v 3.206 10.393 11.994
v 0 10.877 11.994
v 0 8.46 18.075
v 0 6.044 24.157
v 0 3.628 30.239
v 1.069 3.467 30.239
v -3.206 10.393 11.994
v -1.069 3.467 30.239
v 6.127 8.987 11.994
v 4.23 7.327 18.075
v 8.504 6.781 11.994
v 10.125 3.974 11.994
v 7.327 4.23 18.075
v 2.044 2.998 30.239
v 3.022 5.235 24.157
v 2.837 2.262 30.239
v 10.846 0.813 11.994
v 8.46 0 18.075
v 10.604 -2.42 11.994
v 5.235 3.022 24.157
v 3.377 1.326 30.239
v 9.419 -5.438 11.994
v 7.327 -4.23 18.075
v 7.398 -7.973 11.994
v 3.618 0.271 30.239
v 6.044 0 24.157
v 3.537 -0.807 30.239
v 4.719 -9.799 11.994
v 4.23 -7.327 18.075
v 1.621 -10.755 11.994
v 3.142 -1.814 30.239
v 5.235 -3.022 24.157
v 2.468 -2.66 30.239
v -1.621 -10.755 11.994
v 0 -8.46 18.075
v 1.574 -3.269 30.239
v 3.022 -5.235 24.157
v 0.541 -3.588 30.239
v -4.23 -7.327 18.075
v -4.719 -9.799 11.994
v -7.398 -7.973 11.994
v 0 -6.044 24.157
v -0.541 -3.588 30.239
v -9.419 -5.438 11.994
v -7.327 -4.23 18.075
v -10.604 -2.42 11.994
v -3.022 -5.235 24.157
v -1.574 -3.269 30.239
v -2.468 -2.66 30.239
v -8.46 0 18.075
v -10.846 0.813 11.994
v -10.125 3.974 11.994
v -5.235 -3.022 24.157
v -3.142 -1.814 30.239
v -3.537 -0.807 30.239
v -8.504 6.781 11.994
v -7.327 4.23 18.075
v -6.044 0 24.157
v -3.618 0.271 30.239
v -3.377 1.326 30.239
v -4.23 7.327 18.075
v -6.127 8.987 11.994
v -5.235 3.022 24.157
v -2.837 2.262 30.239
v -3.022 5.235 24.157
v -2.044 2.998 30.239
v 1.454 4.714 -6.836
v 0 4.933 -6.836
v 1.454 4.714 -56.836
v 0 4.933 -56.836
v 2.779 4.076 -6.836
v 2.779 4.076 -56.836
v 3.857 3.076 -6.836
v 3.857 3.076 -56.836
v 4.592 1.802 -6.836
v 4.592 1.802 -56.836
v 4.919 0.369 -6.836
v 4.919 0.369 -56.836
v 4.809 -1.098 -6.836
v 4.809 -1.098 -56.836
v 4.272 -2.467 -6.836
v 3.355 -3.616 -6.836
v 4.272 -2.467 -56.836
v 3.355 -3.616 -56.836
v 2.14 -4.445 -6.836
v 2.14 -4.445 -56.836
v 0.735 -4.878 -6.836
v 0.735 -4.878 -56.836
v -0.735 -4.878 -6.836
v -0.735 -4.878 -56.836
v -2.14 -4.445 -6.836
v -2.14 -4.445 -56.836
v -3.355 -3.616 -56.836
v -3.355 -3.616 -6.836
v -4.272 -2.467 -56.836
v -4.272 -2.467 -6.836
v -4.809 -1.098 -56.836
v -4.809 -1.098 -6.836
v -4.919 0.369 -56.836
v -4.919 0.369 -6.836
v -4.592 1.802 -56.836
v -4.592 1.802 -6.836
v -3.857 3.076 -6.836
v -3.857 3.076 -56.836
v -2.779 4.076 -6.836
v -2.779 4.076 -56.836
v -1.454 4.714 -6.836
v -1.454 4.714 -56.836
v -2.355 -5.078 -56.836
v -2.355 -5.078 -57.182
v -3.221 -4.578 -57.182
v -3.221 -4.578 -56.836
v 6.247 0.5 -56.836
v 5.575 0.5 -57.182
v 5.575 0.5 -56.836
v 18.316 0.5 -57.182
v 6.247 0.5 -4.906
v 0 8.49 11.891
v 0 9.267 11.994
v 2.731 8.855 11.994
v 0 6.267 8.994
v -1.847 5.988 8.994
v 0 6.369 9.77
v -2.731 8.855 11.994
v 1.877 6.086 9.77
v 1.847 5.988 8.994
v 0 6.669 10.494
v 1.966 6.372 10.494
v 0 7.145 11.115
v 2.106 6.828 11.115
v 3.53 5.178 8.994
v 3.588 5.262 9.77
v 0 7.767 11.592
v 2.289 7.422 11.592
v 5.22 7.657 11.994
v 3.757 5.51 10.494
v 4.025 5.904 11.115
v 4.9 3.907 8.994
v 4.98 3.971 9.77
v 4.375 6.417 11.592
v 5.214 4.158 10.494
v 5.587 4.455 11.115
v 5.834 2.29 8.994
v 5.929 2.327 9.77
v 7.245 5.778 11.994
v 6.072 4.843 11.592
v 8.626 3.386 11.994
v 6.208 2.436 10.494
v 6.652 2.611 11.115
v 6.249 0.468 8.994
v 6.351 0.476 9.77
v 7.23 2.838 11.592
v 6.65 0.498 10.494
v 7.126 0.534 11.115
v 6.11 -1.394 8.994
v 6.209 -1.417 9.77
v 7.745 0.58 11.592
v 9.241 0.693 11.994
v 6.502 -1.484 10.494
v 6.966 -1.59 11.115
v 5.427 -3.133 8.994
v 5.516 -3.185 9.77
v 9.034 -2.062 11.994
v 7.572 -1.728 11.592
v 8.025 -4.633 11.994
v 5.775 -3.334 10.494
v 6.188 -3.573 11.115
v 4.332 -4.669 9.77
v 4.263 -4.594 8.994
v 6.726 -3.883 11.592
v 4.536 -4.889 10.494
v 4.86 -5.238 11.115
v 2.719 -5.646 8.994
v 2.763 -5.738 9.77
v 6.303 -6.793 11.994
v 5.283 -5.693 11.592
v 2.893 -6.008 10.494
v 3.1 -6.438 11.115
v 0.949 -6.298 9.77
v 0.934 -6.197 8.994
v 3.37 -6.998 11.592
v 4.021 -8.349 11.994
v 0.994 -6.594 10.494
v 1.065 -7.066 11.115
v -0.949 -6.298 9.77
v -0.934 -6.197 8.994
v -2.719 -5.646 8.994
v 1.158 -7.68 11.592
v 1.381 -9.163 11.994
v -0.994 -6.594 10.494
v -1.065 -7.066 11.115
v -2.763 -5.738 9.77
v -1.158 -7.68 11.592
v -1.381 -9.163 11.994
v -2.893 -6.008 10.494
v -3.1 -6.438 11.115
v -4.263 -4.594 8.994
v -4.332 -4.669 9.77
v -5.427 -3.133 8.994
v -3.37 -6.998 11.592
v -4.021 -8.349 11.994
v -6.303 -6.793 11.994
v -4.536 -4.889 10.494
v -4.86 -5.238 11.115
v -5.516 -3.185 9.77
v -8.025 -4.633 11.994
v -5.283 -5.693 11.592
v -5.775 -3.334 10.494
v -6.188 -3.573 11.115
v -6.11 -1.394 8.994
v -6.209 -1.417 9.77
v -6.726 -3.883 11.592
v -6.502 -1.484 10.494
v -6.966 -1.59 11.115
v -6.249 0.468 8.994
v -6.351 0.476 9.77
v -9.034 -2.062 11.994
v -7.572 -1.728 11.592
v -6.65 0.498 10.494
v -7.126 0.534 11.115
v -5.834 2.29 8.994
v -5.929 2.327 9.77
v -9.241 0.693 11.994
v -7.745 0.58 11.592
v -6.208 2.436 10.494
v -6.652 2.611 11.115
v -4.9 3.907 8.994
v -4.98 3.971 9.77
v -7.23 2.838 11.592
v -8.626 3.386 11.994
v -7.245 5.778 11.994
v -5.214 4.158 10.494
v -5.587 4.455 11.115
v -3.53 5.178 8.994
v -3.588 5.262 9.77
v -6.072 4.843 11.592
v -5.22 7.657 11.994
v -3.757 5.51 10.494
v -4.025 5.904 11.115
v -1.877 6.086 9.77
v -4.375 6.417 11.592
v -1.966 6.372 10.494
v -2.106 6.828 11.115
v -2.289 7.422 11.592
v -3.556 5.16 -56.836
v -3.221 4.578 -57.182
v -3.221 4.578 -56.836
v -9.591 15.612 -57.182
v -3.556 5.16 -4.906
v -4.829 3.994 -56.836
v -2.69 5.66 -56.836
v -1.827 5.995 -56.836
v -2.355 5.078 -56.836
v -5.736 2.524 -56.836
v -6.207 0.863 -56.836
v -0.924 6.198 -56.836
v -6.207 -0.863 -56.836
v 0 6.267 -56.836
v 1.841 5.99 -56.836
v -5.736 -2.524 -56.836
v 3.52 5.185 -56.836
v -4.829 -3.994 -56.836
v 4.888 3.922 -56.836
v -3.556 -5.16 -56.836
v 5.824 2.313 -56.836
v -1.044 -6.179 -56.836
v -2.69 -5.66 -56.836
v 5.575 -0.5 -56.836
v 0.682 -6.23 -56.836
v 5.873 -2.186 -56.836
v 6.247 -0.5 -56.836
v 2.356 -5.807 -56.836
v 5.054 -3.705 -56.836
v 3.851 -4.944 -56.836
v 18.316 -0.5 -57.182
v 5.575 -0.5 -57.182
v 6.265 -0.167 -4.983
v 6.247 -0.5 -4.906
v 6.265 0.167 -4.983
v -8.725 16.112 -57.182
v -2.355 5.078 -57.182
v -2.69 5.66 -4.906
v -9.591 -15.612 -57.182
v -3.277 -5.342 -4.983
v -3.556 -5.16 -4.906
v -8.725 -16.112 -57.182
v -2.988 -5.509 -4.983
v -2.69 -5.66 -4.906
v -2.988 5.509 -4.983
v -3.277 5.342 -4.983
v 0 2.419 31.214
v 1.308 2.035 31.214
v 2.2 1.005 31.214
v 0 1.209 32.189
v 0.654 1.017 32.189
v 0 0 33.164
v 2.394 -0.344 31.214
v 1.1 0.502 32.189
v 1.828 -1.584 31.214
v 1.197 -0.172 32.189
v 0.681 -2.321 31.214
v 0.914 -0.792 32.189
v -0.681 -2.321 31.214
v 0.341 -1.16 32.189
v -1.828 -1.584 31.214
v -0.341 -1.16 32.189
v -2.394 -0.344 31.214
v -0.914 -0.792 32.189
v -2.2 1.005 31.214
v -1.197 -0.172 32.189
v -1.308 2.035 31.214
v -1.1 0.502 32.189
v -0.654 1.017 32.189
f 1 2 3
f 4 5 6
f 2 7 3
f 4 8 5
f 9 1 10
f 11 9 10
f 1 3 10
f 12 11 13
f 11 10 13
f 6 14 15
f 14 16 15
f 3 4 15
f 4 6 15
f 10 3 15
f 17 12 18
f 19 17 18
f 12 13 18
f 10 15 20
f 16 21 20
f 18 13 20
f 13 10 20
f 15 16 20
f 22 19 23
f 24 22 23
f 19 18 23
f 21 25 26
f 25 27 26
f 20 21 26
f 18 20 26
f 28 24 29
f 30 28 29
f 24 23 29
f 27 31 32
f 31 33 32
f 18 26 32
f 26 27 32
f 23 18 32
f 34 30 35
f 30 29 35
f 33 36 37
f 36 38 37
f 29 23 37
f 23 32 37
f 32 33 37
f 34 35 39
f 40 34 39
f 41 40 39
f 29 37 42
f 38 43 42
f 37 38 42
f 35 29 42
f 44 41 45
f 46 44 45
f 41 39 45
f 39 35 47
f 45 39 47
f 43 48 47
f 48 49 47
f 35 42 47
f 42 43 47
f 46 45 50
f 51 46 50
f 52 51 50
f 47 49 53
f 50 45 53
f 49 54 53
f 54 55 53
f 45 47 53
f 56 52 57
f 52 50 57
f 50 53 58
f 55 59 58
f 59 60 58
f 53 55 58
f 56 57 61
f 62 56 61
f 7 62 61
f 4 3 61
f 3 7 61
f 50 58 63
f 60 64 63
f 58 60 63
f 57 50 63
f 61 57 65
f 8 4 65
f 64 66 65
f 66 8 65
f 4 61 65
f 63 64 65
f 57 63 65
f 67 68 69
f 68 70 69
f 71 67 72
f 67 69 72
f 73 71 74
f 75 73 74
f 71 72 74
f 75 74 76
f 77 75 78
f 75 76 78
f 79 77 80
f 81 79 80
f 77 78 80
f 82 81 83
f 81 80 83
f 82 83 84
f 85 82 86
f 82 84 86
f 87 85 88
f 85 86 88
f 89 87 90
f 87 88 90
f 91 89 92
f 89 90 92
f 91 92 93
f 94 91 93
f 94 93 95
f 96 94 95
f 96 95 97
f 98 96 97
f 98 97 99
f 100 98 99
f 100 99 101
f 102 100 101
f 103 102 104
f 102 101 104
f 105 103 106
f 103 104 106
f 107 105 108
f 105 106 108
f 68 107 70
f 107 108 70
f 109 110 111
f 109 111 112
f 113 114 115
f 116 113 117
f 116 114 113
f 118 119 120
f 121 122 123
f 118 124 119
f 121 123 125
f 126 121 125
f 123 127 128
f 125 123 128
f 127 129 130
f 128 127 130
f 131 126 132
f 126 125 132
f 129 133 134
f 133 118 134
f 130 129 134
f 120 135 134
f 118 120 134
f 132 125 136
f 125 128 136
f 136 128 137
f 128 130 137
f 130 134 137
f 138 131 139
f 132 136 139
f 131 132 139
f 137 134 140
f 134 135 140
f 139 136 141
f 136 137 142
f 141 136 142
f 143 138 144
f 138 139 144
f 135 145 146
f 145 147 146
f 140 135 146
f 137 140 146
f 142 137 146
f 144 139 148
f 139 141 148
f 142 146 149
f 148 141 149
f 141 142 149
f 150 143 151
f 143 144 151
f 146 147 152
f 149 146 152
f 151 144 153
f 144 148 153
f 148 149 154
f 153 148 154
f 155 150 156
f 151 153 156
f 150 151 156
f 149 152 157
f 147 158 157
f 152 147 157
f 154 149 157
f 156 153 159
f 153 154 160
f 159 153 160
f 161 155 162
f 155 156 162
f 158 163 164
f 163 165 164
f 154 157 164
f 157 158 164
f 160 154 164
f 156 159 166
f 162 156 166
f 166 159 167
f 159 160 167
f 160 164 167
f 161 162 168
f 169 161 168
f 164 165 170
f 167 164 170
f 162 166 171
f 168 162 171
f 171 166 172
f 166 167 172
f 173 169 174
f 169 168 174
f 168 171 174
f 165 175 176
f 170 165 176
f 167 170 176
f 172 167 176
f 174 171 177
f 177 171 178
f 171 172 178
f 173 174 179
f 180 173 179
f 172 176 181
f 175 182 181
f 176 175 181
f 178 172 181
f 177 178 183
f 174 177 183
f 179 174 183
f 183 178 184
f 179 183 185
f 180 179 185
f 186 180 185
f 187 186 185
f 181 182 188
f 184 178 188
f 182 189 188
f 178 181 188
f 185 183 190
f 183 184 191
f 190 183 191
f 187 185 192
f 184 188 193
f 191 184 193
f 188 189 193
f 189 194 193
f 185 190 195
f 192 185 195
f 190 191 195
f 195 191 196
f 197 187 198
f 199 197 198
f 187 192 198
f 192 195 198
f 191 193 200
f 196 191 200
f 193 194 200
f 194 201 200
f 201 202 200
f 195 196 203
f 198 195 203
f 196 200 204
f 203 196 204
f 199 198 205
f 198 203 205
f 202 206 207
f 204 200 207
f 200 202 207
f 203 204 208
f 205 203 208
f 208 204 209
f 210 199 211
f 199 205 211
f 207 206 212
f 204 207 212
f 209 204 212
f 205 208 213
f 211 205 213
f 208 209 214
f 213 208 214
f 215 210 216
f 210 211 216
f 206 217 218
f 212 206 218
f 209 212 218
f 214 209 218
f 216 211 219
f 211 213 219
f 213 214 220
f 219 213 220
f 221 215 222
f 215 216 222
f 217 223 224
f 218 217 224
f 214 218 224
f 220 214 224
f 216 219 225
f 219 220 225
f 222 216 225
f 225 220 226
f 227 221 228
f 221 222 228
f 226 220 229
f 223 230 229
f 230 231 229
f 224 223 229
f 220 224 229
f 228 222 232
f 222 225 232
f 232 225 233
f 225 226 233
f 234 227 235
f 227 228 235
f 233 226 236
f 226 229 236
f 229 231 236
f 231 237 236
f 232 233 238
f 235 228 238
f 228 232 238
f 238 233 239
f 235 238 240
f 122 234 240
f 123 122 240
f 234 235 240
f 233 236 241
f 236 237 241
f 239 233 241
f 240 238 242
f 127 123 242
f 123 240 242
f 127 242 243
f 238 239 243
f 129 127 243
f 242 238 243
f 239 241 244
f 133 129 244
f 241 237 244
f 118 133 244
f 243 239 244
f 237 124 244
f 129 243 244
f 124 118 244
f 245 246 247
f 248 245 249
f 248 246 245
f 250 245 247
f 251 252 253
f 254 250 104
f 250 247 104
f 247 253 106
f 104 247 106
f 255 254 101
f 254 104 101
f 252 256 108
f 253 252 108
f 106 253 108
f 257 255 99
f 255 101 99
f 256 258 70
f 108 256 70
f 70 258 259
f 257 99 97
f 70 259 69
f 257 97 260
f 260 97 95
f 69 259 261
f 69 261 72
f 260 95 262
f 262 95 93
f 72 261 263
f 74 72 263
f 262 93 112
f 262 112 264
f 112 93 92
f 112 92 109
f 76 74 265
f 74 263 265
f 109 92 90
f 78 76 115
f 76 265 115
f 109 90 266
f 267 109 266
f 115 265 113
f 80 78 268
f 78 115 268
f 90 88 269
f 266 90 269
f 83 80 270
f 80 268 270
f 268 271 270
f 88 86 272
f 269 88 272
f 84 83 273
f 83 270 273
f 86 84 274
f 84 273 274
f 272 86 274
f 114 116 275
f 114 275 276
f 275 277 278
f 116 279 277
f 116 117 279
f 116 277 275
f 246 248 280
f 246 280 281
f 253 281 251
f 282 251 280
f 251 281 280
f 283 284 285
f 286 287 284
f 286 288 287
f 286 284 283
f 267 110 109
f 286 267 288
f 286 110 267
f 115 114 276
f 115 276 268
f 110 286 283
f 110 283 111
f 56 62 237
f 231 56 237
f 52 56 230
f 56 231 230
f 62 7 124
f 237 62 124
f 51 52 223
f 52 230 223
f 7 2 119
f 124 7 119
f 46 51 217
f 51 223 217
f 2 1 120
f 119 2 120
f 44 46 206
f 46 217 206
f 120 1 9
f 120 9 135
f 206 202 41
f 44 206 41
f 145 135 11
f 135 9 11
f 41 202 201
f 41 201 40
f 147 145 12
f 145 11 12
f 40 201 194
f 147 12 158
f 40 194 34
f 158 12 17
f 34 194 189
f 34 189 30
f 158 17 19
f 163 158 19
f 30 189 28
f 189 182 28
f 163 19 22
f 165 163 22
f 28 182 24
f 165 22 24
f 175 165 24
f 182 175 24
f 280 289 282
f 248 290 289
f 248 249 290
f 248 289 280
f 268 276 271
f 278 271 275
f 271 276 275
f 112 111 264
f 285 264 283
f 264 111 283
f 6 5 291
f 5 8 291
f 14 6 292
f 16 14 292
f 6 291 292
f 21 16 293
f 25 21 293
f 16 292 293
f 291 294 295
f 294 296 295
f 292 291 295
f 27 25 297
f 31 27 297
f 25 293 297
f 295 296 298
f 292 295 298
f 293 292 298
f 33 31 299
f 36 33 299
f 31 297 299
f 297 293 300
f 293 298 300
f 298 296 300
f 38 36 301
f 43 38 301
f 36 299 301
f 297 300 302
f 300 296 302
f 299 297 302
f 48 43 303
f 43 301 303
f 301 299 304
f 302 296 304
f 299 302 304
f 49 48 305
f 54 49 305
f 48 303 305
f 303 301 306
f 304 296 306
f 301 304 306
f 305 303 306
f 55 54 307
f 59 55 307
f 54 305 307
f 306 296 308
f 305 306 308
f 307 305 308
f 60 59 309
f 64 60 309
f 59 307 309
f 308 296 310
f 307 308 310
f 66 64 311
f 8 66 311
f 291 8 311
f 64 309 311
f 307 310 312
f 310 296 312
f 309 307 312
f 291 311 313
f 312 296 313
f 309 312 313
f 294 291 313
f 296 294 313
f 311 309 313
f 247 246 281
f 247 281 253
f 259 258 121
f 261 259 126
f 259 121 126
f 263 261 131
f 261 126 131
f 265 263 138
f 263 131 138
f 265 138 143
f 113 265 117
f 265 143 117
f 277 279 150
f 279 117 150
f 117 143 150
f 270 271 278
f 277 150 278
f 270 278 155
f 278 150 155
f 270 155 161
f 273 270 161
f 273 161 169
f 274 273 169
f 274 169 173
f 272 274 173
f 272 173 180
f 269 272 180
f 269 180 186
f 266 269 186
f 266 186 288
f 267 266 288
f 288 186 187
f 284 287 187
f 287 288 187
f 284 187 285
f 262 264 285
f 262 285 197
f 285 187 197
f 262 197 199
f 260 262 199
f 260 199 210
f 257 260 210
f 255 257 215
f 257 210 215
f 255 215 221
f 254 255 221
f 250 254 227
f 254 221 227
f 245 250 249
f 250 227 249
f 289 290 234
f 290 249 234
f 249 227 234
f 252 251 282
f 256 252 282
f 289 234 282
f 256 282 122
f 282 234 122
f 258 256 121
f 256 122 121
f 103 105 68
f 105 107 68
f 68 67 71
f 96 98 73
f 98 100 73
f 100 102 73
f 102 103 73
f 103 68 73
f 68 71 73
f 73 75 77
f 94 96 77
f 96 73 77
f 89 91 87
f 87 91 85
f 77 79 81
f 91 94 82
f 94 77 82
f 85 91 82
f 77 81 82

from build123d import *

# Parameters (mm, degrees)
FILLET1_R           = 3
BOSS_EXTRUDE2_DEPTH = 0.5
CIRPATTERN3_COUNT   = 3


with BuildPart() as part:
    # Sketch1 → Revolve2 (revolve)
    with BuildSketch(Plane(origin=(0, 0, 0), x_dir=(0, 0, -1), z_dir=(1, 0, 0))):
        Polygon((6.835567607, 0), (6.835567607, 4.933028396), (56.835567607, 4.933028396), (56.835567607, 6.266802226), (-11.993527317, 6.266802226), (-11.993527317, 10.876596073), (-30.238642963, 3.628152456), (-33.164432393, 0), align=None)
    revolve(axis=Axis((0, 0, 44.67851679), (0, 0, -1)))

    # Fillet1
    fillet1_edges = [part.edges().sort_by_distance(p)[0] for p in [
        (0, -6.266802226, 11.993527317),
    ]]
    fillet(fillet1_edges, radius=FILLET1_R)

    # Sketch2 → Boss-Extrude2 (add, symmetric)
    with BuildSketch(Plane(origin=(0, 0, 0), x_dir=(1, 0, 0), z_dir=(0, 1, 0))):
        Polygon((5.575190906, 1.997056238), (18.315636179, 57.181987564), (5.575190906, 57.181987564), align=None)
    boss_extrude2 = extrude(amount=BOSS_EXTRUDE2_DEPTH, both=True)

    # CirPattern3: Boss-Extrude2 ×3 about axis
    cirpattern3_axis = Axis((0, 0, -56.835567607), (0, 0, 1))
    for i in range(1, CIRPATTERN3_COUNT):
        add(boss_extrude2.rotate(cirpattern3_axis, i * 360 / CIRPATTERN3_COUNT))


solid = part.part
